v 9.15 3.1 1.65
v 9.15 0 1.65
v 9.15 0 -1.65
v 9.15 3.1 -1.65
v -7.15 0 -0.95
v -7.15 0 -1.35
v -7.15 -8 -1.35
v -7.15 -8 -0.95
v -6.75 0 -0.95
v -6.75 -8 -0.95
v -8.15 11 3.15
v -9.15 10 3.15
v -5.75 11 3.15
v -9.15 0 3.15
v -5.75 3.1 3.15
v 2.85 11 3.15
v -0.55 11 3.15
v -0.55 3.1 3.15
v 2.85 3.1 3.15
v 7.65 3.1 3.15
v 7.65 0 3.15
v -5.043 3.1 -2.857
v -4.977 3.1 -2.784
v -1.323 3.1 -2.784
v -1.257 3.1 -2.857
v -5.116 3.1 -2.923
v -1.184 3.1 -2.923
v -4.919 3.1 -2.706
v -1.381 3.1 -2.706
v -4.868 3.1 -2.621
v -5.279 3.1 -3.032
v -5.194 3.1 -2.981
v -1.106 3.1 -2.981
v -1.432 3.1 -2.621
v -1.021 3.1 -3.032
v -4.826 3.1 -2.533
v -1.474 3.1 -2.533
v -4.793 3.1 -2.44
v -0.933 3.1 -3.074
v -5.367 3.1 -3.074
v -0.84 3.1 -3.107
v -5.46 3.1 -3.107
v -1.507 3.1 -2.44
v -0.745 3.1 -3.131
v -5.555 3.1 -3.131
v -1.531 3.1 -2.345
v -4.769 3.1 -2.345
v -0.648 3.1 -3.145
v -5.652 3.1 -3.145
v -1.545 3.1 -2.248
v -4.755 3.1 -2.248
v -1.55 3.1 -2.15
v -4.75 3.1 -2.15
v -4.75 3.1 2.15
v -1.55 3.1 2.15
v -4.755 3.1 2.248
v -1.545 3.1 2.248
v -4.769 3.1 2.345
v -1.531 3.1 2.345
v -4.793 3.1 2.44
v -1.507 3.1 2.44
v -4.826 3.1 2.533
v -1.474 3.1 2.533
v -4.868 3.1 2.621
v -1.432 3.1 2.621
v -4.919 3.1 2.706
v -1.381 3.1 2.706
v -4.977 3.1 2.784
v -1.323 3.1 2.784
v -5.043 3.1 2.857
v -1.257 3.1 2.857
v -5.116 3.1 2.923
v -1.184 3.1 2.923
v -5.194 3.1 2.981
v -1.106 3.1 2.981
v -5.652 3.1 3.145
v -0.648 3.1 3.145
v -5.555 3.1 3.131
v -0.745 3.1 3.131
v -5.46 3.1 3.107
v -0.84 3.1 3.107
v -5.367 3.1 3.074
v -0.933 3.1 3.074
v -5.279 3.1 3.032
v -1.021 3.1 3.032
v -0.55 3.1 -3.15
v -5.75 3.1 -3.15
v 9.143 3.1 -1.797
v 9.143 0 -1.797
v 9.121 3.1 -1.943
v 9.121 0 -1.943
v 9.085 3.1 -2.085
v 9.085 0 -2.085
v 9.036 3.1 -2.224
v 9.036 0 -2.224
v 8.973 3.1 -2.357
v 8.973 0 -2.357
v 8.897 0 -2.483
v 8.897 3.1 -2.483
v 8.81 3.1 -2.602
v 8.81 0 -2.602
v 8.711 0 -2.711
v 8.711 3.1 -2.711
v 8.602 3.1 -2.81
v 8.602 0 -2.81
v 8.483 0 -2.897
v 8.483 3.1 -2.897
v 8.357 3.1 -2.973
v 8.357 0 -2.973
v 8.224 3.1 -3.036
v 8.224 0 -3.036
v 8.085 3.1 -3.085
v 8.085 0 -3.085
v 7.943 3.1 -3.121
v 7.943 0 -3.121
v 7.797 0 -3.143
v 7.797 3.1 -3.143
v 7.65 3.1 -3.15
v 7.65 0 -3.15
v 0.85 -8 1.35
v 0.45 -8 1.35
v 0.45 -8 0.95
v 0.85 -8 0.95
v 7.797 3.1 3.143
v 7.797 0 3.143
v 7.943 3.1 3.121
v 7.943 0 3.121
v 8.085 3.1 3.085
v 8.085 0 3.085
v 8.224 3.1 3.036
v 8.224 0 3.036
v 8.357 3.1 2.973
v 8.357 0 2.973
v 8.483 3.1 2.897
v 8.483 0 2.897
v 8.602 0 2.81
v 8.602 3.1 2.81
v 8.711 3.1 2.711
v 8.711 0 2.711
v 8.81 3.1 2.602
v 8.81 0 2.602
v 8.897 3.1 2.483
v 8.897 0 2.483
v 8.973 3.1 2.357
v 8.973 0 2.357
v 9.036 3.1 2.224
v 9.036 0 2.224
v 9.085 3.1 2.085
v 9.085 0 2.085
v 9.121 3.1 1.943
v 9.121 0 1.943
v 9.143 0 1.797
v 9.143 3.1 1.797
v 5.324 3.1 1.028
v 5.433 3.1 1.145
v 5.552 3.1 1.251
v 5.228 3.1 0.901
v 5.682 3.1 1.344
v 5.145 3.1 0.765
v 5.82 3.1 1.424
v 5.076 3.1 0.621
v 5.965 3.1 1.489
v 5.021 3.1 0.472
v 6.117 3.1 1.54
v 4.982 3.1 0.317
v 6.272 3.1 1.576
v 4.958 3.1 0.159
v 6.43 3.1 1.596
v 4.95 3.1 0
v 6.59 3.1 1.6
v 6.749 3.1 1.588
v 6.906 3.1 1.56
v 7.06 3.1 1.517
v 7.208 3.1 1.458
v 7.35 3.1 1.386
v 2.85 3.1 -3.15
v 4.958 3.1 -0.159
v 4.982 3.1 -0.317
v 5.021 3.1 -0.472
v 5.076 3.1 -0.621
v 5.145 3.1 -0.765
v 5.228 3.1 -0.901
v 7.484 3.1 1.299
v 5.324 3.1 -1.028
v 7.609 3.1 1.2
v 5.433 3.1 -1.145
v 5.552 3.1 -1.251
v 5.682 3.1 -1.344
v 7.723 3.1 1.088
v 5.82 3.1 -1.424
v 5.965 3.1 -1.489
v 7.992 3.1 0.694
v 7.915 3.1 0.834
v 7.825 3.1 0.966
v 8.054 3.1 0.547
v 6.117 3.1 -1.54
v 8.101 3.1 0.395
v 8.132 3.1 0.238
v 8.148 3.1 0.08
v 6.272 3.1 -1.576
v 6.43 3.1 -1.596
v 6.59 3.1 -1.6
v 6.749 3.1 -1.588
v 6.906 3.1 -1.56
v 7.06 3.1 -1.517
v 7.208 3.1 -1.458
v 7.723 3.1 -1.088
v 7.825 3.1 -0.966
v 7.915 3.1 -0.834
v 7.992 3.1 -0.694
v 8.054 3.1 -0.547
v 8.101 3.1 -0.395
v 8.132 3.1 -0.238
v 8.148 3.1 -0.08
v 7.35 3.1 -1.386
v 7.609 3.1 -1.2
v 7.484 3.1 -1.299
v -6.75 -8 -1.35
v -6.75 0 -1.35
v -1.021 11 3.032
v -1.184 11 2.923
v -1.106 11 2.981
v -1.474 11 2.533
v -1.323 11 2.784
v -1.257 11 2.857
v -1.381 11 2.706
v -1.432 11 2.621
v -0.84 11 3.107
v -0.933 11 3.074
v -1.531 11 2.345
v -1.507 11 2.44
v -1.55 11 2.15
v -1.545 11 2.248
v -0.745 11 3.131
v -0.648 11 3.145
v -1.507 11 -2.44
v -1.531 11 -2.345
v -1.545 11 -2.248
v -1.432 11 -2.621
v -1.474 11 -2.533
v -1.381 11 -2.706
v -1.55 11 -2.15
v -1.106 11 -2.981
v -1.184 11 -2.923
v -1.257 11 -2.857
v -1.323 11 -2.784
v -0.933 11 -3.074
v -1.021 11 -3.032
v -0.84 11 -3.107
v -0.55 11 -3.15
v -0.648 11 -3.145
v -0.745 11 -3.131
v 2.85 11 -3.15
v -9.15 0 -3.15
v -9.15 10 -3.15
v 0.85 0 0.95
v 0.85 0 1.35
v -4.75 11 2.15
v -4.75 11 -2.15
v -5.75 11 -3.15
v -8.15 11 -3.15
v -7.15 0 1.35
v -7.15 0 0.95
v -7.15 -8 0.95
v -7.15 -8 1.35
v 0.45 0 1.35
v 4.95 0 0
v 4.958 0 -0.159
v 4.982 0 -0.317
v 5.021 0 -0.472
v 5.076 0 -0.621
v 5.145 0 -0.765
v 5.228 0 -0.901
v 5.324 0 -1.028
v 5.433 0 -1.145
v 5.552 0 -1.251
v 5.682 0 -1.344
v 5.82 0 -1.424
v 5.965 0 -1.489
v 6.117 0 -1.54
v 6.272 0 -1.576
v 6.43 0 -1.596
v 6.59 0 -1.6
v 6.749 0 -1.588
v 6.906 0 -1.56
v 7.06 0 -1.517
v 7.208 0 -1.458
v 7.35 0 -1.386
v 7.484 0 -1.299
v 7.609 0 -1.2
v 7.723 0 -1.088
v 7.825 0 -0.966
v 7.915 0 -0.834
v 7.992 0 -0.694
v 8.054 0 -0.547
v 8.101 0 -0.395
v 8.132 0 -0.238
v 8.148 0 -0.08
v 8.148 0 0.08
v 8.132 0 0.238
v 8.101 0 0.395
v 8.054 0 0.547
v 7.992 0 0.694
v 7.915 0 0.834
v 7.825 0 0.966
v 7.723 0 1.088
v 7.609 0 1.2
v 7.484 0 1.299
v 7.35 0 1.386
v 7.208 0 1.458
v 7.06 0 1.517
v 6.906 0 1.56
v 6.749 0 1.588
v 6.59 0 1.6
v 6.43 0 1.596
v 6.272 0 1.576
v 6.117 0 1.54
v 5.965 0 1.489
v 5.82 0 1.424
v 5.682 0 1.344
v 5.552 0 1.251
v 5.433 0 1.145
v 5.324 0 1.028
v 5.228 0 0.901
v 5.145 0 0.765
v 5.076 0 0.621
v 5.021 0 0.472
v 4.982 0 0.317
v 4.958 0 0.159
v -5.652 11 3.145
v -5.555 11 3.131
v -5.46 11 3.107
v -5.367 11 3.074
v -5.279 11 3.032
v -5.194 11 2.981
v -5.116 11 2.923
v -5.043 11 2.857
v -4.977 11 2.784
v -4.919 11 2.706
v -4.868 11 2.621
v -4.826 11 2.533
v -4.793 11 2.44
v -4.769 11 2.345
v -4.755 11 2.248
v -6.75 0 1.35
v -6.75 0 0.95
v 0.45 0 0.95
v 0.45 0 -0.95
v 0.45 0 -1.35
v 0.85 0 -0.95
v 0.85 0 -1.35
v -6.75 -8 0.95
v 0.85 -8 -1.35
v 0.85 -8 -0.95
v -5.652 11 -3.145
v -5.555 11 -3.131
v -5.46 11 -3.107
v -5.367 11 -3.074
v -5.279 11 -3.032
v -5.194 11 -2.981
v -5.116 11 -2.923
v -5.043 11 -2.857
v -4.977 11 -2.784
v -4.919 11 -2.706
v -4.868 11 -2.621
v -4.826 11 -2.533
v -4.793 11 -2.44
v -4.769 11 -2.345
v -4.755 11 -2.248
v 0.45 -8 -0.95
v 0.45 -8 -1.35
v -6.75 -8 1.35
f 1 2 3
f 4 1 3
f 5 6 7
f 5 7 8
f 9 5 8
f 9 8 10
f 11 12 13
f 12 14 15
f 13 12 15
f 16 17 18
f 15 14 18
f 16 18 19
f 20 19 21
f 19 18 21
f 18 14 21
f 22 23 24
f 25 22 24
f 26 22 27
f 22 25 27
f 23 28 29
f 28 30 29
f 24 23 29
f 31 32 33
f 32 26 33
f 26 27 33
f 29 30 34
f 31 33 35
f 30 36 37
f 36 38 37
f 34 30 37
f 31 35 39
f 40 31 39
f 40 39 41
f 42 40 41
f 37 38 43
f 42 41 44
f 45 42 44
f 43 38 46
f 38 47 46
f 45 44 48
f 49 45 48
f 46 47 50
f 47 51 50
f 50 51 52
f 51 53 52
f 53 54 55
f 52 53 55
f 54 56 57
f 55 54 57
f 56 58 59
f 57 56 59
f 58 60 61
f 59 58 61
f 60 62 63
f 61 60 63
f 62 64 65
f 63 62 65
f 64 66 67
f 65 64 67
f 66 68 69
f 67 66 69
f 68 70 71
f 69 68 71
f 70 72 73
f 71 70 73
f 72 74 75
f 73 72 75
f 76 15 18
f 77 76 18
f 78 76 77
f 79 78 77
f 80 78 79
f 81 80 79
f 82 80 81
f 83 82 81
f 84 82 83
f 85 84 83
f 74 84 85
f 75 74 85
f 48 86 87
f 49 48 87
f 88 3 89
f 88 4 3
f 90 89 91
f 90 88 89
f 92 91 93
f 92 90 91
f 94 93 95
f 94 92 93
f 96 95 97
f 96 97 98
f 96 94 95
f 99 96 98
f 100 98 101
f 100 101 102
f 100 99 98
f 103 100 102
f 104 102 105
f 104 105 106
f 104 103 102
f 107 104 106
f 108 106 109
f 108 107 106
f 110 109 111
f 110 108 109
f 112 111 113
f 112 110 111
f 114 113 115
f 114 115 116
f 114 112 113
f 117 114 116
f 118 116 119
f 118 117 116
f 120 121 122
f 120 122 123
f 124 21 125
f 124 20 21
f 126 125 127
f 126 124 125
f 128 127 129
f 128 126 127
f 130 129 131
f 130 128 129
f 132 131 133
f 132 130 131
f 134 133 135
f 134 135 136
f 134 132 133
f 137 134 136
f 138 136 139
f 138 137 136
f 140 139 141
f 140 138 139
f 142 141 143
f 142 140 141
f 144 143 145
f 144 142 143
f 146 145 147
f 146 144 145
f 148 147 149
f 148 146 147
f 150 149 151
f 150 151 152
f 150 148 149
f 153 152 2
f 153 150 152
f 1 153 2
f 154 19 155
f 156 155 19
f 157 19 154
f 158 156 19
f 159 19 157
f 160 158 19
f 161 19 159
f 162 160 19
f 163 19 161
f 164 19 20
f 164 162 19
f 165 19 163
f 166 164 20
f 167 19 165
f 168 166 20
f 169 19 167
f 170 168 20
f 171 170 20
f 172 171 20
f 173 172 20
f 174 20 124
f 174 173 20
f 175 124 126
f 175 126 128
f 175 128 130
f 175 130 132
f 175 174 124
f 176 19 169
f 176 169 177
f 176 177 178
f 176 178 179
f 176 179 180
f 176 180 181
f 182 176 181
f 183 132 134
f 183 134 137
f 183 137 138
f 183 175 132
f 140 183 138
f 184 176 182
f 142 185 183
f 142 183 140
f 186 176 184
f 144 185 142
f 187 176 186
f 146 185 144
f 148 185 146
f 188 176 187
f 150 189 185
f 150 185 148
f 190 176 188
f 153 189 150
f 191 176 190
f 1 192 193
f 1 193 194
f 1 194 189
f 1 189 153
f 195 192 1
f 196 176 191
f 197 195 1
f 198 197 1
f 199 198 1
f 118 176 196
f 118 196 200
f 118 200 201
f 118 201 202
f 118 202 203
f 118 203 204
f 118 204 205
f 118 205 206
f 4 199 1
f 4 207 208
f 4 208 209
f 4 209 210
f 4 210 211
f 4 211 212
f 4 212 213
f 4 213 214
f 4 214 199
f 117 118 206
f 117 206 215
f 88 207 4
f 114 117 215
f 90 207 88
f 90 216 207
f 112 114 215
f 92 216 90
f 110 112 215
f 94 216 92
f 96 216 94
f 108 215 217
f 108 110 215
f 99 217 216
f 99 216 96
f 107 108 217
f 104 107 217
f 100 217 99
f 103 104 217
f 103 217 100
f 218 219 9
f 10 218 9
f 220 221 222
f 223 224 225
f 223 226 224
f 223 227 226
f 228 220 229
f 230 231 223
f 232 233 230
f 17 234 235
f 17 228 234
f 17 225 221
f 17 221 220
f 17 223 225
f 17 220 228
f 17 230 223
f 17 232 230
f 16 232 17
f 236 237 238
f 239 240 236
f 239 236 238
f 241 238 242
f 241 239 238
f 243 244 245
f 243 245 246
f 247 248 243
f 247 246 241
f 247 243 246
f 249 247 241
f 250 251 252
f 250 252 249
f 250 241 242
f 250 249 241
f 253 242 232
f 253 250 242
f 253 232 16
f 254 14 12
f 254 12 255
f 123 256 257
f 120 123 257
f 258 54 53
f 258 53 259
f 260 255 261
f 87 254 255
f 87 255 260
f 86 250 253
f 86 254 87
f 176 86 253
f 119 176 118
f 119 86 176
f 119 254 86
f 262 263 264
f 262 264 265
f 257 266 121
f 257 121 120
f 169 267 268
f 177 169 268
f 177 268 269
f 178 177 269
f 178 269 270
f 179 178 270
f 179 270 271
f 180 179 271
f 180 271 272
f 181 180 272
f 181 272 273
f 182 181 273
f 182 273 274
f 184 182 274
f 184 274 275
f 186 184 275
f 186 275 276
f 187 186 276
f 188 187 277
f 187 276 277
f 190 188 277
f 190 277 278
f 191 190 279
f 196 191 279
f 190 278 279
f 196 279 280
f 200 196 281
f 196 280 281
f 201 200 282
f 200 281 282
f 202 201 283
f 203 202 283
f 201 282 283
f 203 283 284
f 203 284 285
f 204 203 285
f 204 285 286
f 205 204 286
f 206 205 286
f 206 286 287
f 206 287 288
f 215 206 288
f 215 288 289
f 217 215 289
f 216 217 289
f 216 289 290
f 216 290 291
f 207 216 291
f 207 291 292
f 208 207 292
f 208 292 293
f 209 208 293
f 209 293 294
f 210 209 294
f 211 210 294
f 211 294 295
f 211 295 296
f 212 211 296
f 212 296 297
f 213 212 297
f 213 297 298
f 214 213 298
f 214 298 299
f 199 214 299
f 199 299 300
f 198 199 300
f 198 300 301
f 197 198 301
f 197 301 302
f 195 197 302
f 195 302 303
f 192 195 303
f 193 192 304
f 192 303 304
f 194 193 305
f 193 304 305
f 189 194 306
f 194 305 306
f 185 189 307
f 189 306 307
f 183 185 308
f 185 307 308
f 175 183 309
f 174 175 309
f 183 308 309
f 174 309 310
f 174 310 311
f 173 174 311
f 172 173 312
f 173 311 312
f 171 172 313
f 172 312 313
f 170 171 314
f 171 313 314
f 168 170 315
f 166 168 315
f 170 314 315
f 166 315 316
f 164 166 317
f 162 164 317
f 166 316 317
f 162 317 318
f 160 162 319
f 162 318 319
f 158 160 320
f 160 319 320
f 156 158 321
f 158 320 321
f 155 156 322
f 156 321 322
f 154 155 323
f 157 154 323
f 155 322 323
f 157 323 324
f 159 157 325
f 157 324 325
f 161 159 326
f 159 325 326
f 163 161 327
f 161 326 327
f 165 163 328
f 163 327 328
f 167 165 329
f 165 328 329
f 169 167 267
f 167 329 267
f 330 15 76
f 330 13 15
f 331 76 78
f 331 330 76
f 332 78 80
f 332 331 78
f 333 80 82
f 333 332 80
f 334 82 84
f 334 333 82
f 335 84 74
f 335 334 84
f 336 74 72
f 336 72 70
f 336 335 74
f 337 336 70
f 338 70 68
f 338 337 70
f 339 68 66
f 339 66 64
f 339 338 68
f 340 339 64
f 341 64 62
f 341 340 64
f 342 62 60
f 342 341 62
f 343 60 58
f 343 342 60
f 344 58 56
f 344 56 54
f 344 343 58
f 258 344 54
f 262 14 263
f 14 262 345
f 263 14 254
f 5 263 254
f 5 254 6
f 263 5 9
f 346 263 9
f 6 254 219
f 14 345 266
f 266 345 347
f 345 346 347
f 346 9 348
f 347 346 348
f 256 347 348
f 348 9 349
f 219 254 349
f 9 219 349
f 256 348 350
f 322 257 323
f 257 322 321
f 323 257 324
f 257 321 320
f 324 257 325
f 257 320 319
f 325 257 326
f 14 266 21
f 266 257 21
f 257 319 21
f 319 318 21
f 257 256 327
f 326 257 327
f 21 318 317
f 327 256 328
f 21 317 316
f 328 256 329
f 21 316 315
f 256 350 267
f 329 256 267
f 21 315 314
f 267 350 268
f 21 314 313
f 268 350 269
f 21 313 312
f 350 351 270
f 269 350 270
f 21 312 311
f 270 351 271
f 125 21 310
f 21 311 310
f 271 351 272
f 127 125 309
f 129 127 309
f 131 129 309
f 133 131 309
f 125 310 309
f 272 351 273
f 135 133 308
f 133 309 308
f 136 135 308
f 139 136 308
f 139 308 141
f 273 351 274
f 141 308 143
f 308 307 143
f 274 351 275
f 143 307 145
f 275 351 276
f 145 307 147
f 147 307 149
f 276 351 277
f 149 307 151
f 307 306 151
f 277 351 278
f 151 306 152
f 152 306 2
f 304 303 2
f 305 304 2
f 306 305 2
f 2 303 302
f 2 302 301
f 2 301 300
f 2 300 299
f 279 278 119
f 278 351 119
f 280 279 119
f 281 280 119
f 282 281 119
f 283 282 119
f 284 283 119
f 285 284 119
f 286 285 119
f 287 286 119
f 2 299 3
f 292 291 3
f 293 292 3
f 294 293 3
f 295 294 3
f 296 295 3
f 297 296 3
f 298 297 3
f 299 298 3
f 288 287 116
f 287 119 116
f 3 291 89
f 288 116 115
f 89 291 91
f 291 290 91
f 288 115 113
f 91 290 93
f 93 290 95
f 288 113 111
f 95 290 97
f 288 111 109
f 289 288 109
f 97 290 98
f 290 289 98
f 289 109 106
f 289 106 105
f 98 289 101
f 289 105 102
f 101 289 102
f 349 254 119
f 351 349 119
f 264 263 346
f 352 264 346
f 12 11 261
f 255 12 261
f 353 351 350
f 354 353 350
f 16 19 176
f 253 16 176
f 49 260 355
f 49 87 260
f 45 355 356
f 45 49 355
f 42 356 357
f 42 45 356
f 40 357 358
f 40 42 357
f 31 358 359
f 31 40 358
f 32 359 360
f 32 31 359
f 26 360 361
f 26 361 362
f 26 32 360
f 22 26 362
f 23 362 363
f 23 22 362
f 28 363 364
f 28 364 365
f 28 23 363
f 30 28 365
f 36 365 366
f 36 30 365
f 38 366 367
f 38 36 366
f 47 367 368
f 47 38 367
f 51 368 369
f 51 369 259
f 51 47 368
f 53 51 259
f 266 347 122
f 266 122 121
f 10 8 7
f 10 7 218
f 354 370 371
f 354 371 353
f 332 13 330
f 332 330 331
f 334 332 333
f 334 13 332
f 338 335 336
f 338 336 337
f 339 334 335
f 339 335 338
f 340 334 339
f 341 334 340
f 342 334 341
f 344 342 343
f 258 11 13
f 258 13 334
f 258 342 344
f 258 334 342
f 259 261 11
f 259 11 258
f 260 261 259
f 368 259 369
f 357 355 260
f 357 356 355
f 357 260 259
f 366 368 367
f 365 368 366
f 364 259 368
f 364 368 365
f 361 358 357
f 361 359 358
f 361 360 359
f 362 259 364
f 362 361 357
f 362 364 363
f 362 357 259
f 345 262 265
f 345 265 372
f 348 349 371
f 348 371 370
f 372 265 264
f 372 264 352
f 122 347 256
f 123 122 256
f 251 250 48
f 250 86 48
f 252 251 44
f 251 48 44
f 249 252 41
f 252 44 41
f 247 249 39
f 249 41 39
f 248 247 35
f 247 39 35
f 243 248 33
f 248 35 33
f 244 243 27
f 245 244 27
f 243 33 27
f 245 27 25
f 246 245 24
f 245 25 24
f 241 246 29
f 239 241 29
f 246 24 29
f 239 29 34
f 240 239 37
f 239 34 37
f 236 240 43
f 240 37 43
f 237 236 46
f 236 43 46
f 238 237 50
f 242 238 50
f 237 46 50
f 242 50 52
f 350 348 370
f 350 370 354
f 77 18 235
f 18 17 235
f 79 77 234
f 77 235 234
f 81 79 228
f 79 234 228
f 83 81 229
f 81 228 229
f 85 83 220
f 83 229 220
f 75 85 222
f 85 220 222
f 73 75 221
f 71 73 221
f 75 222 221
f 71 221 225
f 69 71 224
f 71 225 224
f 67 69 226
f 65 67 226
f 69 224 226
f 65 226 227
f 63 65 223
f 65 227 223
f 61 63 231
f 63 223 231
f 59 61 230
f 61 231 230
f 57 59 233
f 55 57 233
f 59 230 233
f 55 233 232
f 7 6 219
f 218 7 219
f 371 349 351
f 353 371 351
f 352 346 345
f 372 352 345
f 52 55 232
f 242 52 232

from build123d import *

# Parameters (mm, degrees)
SKETCH1_W                  = 18.3
SKETCH1_H                  = 6.3
BOSS_EXTRUDE1_DEPTH        = 3.1
FILLET1_R                  = 1.5
SKETCH2_W                  = 12
SKETCH2_H                  = 6.3
BOSS_EXTRUDE2_DEPTH        = 7.9
F_3_2_3_2_DIAMETER_HOLE1_D = 3.2
SKETCH5_W                  = 3.2
SKETCH5_H                  = 7.9
CUT_EXTRUDE1_DEPTH         = 16.633697579
CHAMFER1_SIZE              = 1
FILLET2_R                  = 1
SKETCH6_W                  = 0.4
SKETCH6_H                  = 0.4
BOSS_EXTRUDE3_DEPTH        = 8
LPATTERN1_COUNT            = 2
LPATTERN1_PITCH            = 7.6


with BuildPart() as part:
    # Sketch1 → Boss-Extrude1 (new body)
    with BuildSketch(Plane(origin=(0, 0, 0), x_dir=(1, 0, 0), z_dir=(0, 1, 0))):
        Rectangle(SKETCH1_W, SKETCH1_H)
    extrude(amount=BOSS_EXTRUDE1_DEPTH)

    # Fillet1
    fillet1_edges = [part.edges().sort_by_distance(p)[0] for p in [
        (9.15, 1.55, 3.15),
        (9.15, 1.55, -3.15),
    ]]
    fillet(fillet1_edges, radius=FILLET1_R)

    # Sketch2 → Boss-Extrude2 (add)
    with BuildSketch(Plane(origin=(0, 3.1, 0), x_dir=(1, 0, 0), z_dir=(0, 1, 0))):
        with Locations((-3.15, 0)):
            Rectangle(SKETCH2_W, SKETCH2_H)
    extrude(amount=BOSS_EXTRUDE2_DEPTH)

    # Ø3.2 (3.2) Diameter Hole1 (through all)
    with Locations(Plane(origin=(0, 3.1, 0), x_dir=(1, 0, 0), z_dir=(0, 1, 0))):
        with Locations((6.55, 0)):
            Hole(F_3_2_3_2_DIAMETER_HOLE1_D / 2)

    # Sketch5 → Cut-Extrude1 (cut, through all)
    with BuildSketch(Plane.XY.offset(3.15)):
        with Locations((-3.15, 7.05)):
            Rectangle(SKETCH5_W, SKETCH5_H)
    extrude(amount=-CUT_EXTRUDE1_DEPTH, mode=Mode.SUBTRACT)

    # Chamfer1
    chamfer1_edges = [part.edges().sort_by_distance(p)[0] for p in [
        (-9.15, 11, 0),
    ]]
    chamfer(chamfer1_edges, length=CHAMFER1_SIZE)

    # Fillet2
    fillet2_edges = [part.edges().sort_by_distance(p)[0] for p in [
        (-4.75, 7.05, -3.15),
        (-1.55, 7.05, -3.15),
        (-4.75, 7.05, 3.15),
        (-1.55, 7.05, 3.15),
    ]]
    fillet(fillet2_edges, radius=FILLET2_R)

    # Sketch6 → Boss-Extrude3 (add)
    with BuildSketch(Plane.XZ):
        with Locations((0.65, 1.15)):
            Rectangle(SKETCH6_W, SKETCH6_H)
        with Locations((0.65, -1.15)):
            Rectangle(SKETCH6_W, SKETCH6_H)
    boss_extrude3 = extrude(amount=BOSS_EXTRUDE3_DEPTH)

    # LPattern1: Boss-Extrude3 ×2
    with Locations(*[(-i * LPATTERN1_PITCH, 0, 0) for i in range(1, LPATTERN1_COUNT)]):
        add(boss_extrude3)


solid = part.part
